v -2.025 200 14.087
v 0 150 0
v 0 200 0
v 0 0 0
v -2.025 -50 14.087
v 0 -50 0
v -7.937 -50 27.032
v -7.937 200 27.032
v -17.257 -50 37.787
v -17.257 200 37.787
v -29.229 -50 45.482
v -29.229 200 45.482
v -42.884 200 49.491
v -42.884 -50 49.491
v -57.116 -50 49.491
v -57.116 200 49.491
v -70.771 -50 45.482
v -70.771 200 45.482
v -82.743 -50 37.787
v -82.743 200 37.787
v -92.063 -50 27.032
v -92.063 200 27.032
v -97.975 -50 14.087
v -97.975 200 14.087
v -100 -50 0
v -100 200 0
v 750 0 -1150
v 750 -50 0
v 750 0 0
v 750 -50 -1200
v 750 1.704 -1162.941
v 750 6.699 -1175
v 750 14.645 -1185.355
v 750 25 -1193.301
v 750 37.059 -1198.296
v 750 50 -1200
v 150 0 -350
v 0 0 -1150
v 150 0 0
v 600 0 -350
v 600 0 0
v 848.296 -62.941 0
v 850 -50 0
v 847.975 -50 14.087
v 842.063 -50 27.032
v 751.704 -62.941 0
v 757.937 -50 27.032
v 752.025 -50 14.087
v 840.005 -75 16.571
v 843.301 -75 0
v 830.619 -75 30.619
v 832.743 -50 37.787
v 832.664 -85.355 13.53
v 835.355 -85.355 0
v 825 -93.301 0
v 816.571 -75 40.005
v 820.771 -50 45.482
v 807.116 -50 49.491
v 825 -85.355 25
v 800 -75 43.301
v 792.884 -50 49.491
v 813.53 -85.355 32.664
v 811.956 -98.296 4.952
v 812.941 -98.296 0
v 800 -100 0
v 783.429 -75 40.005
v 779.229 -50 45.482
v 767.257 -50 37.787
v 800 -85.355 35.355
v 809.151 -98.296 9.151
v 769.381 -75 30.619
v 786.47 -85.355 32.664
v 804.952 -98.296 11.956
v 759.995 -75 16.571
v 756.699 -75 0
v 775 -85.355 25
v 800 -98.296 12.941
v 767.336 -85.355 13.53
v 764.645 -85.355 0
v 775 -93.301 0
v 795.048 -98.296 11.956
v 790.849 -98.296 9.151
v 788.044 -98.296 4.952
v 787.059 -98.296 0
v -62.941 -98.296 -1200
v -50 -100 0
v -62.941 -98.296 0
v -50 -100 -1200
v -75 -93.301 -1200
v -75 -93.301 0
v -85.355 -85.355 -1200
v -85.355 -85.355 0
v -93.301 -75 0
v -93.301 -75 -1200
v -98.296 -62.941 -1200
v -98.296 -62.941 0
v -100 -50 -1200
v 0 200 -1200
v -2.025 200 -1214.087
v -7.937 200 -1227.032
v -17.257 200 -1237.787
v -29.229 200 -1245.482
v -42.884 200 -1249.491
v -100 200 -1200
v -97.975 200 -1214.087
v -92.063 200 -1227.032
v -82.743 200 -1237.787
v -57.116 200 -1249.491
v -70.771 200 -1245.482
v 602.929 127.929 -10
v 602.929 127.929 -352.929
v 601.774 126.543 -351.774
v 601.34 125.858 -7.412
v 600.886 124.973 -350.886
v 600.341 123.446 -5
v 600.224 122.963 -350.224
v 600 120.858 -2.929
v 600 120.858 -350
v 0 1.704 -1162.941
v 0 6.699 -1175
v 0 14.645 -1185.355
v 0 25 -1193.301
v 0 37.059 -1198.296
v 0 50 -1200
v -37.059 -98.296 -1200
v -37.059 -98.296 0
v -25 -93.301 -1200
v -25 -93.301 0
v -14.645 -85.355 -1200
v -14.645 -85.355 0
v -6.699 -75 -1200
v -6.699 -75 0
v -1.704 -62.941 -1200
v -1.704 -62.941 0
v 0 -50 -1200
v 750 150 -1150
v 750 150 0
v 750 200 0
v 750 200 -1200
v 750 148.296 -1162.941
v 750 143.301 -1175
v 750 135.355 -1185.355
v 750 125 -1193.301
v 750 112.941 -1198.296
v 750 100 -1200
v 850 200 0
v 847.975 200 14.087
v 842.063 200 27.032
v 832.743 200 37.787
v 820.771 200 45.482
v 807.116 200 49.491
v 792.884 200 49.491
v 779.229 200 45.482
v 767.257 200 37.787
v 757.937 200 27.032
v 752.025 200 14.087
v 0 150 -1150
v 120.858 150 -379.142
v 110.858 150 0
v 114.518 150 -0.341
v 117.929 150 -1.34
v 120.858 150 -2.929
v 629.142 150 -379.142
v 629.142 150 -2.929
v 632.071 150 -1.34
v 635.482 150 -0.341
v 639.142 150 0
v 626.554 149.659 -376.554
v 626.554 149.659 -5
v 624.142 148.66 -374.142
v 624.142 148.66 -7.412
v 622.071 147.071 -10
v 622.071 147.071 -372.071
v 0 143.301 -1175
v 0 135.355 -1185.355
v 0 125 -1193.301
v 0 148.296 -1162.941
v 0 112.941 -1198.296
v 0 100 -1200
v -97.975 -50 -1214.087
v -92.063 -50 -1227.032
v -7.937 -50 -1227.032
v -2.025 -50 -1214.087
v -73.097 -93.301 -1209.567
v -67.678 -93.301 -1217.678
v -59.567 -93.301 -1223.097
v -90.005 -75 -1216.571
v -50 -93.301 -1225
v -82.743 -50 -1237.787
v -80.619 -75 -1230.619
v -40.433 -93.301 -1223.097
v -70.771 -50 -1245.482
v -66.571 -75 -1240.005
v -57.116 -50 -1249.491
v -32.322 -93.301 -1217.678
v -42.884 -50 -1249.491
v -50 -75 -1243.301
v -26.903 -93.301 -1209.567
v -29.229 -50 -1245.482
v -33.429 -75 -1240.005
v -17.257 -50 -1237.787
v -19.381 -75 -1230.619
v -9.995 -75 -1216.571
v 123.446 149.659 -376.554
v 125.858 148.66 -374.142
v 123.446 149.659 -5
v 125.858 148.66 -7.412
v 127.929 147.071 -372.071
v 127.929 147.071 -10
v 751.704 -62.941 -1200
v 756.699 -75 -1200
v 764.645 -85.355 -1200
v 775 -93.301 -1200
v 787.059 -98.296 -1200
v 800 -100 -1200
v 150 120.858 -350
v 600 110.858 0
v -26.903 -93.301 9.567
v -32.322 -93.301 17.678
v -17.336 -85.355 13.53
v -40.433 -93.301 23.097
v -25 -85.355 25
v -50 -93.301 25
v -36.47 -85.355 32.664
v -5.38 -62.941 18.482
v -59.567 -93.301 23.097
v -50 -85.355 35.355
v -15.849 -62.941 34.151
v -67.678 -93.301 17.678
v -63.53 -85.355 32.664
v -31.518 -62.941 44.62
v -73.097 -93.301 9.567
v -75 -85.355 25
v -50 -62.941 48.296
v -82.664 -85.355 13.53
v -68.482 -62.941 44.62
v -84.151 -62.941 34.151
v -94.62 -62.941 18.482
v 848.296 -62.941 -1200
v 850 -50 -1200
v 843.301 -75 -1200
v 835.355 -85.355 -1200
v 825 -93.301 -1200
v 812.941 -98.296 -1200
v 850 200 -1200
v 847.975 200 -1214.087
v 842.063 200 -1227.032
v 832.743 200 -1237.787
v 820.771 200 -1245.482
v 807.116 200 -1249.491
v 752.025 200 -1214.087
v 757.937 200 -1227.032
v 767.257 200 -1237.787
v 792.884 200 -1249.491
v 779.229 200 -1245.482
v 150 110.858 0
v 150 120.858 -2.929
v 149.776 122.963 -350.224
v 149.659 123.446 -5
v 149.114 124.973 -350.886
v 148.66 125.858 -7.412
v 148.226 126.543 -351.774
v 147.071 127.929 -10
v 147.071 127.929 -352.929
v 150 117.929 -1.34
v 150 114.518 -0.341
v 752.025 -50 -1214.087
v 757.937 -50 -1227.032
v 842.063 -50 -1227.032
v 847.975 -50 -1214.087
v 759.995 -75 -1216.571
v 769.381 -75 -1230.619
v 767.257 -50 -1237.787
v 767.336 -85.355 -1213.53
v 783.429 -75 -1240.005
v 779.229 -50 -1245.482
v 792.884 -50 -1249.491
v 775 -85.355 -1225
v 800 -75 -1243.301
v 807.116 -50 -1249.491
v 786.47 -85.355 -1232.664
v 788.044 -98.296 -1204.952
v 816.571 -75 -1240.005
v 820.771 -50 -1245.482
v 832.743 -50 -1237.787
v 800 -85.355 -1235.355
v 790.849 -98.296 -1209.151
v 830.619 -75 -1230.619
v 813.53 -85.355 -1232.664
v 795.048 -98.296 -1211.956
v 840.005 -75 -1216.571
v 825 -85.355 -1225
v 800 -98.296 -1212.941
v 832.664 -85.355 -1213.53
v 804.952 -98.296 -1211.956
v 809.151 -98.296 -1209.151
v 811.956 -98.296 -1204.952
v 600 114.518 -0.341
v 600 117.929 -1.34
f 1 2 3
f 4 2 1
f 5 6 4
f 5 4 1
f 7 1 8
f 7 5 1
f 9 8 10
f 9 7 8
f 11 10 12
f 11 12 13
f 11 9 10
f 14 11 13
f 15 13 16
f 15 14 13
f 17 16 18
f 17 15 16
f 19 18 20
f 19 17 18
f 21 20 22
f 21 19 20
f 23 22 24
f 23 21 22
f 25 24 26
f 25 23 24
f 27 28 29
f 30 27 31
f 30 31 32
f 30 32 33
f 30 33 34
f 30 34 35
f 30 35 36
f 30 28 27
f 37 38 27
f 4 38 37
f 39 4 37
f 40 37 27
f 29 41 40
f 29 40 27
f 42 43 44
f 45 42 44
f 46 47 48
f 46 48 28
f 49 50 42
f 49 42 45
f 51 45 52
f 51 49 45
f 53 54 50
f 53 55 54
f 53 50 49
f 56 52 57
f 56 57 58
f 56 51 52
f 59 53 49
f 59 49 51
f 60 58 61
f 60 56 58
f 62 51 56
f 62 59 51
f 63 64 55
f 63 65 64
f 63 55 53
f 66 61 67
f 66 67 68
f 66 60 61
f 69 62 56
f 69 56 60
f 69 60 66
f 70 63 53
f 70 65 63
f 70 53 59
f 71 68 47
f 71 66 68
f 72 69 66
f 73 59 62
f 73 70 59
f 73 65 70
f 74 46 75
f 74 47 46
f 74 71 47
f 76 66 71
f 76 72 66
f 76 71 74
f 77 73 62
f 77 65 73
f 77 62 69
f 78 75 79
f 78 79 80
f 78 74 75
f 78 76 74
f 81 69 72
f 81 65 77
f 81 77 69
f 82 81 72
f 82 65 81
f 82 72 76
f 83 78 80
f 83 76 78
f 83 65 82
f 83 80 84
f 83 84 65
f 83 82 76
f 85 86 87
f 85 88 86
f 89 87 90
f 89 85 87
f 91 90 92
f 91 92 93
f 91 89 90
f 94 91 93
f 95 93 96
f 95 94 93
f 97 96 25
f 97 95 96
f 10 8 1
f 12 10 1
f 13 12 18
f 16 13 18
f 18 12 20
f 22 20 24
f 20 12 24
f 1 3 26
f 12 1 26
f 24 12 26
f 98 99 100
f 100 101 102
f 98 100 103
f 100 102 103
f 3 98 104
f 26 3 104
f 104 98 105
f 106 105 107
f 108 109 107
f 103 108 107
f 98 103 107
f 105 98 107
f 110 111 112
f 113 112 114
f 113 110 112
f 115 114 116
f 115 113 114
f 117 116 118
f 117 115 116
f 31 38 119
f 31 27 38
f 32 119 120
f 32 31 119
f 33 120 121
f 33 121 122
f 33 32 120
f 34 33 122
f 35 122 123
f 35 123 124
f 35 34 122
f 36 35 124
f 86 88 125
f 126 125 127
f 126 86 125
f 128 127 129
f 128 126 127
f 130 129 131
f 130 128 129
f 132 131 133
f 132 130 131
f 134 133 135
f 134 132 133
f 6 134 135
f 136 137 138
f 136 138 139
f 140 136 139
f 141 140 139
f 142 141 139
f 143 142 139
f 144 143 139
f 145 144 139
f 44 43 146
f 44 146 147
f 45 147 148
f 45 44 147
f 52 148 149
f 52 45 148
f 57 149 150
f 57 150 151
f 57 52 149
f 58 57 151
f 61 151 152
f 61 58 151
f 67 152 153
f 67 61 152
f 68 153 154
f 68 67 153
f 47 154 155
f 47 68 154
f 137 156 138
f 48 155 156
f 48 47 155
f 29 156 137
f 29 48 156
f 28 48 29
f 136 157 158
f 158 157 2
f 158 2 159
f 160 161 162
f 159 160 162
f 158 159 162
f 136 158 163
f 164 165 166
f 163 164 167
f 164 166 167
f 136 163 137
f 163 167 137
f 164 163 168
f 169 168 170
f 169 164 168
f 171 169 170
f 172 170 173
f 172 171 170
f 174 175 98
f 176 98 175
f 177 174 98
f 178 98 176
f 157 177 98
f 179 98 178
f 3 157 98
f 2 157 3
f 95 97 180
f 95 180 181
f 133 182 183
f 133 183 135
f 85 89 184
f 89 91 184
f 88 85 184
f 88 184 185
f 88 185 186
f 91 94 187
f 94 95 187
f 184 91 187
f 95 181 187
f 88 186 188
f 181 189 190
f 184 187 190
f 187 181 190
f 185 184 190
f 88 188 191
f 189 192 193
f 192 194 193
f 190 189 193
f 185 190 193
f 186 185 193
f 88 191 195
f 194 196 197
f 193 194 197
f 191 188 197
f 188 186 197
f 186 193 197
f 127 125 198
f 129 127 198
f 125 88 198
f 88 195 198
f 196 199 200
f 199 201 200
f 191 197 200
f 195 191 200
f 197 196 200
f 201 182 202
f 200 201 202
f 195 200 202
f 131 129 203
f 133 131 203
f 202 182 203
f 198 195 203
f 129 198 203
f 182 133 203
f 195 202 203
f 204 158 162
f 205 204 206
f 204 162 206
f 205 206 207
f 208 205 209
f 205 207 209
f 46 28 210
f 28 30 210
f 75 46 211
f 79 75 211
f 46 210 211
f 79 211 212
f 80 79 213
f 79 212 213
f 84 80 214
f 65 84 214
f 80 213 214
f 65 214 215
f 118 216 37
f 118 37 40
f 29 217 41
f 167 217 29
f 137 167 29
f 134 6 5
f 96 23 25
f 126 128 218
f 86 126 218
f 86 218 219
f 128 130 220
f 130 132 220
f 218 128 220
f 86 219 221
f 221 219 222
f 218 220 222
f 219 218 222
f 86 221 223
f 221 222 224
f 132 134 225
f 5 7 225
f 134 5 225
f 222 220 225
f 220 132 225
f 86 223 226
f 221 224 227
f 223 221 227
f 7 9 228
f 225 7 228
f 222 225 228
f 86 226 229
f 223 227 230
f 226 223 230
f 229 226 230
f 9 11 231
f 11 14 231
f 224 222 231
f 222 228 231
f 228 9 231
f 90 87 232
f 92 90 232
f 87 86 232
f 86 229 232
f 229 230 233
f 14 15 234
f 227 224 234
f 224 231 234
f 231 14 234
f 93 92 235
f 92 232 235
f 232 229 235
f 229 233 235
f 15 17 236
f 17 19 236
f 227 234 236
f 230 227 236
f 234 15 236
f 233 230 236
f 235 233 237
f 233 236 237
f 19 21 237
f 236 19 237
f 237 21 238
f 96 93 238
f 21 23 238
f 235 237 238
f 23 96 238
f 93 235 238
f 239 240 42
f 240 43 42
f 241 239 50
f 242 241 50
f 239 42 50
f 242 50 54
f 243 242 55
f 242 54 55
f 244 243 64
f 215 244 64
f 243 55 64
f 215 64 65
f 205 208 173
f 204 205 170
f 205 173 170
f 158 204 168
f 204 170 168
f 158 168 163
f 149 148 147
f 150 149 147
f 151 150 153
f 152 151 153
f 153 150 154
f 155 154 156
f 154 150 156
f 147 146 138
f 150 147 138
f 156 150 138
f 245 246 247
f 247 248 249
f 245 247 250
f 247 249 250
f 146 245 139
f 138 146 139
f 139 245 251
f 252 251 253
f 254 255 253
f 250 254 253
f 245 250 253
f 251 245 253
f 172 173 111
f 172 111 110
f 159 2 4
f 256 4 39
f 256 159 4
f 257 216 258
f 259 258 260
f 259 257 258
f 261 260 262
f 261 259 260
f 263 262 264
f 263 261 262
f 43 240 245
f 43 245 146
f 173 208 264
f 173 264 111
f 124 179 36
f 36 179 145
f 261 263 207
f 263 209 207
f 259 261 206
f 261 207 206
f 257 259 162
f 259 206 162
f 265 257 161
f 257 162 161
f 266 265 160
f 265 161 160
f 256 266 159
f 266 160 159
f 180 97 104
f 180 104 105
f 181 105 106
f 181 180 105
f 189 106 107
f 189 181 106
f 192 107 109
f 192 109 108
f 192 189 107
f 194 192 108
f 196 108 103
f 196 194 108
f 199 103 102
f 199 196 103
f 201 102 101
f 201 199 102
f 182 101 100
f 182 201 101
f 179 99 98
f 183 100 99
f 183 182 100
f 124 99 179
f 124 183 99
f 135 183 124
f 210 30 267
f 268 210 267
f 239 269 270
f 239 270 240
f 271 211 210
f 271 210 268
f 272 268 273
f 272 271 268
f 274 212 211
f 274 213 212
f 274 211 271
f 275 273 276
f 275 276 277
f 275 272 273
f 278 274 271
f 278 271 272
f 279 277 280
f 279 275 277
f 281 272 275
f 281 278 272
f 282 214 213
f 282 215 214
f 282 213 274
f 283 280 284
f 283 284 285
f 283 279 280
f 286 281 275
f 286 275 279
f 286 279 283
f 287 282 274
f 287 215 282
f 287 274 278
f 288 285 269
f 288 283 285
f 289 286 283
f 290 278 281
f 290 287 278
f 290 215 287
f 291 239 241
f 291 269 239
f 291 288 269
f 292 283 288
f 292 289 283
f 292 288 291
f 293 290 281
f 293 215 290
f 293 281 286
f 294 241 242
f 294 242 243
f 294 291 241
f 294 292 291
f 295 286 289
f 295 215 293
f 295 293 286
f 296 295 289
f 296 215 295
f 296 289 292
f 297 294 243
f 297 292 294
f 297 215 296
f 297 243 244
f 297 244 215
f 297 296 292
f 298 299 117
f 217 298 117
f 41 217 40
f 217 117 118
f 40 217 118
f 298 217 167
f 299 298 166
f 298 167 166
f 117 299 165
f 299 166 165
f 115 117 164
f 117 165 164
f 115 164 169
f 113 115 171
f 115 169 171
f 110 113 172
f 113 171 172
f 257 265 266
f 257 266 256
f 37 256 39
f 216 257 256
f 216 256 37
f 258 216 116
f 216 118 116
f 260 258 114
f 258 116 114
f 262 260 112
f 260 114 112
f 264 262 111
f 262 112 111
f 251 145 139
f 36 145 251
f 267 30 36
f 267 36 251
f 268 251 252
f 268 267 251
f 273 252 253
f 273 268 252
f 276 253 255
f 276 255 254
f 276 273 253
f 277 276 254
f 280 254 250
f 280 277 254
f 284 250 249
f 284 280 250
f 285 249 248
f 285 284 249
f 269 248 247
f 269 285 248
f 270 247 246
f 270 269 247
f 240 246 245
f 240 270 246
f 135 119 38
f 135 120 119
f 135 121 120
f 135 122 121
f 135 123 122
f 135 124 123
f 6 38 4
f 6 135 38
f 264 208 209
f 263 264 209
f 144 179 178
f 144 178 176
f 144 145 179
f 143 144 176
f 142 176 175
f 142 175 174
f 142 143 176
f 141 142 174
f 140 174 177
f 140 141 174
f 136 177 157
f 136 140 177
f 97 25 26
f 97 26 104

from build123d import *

# Parameters (mm, degrees)
SKETCH1_W                = 750
SKETCH1_H                = 150
BOSS_EXTRUDE1_DEPTH      = 1200
BOSS_EXTRUDE8_DEPTH      = 50
BOSS_EXTRUDE8_DEPTH_BACK = 250
FILLET2_R                = 50
FILLET3_R                = 50
SKETCH6_W                = 450
SKETCH6_H                = 350
CUT_EXTRUDE1_DEPTH       = 250
CHAMFER1_SIZE            = 25
CHAMFER2_SIZE            = 25
FILLET4_R                = 10


with BuildPart() as part:
    # Sketch1 → Boss-Extrude1 (new body)
    with BuildSketch(Plane.XY):
        with Locations((375, 75)):
            Rectangle(SKETCH1_W, SKETCH1_H)
    extrude(amount=-BOSS_EXTRUDE1_DEPTH)

    # Sketch2 → Boss-Extrude8 (add, two sides: drawn at the far end of the back side and taken through both)
    with BuildSketch(Plane(origin=(0, 150, 0), x_dir=(1, 0, 0), z_dir=(0, 1, 0)).offset(-BOSS_EXTRUDE8_DEPTH_BACK)):
        with BuildLine():
            Line((0, 1200), (0, 0))
            ThreePointArc((0, 0), (-50, -50), (-100, 0))
            Line((-100, 0), (-100, 1200))
            ThreePointArc((-100, 1200), (-50, 1250), (0, 1200))
        make_face()
        with BuildLine():
            Line((850, 1200), (850, 0))
            ThreePointArc((850, 0), (800, -50), (750, 0))
            Line((750, 0), (750, 1200))
            ThreePointArc((750, 1200), (800, 1250), (850, 1200))
        make_face()
    extrude(amount=BOSS_EXTRUDE8_DEPTH + BOSS_EXTRUDE8_DEPTH_BACK)

    # Fillet2
    fillet2_edges = [part.edges().sort_by_distance(p)[0] for p in [
        (-50, -100, -1250),
        (-100, -100, -600),
        (-50, -100, 50),
        (0, -100, -600),
        (800, -100, 50),
        (850, -100, -600),
        (800, -100, -1250),
        (750, -100, -600),
    ]]
    fillet(fillet2_edges, radius=FILLET2_R - 0.0001)  # a hair under: the kernel refuses the full size

    # Fillet3
    fillet3_edges = [part.edges().sort_by_distance(p)[0] for p in [
        (375, 150, -1200),
        (375, 0, -1200),
    ]]
    fillet(fillet3_edges, radius=FILLET3_R)

    # Sketch6 → Cut-Extrude1 (cut)
    with BuildSketch(Plane(origin=(0, 150, 0), x_dir=(1, 0, 0), z_dir=(0, 1, 0))):
        with Locations((375, 175)):
            Rectangle(SKETCH6_W, SKETCH6_H)
    extrude(amount=-CUT_EXTRUDE1_DEPTH, mode=Mode.SUBTRACT)

    # Chamfer1
    chamfer1_edges = [part.edges().sort_by_distance(p)[0] for p in [
        (375, 150, -350),
    ]]
    chamfer(chamfer1_edges, length=CHAMFER1_SIZE)

    # Chamfer2
    chamfer2_edges = [part.edges().sort_by_distance(p)[0] for p in [
        (150, 150, -187.5),
        (600, 150, -187.5),
    ]]
    chamfer(chamfer2_edges, length=CHAMFER2_SIZE)

    # Fillet4
    fillet4_edges = [part.edges().sort_by_distance(p)[0] for p in [
        (375, 125, -350),
        (375, 150, -375),
        (150, 125, -175),
        (137.5, 137.5, 0),
        (625, 150, -187.5),
        (125, 150, -187.5),
        (600, 125, -175),
        (612.5, 137.5, 0),
    ]]
    fillet(fillet4_edges, radius=FILLET4_R)


solid = part.part
